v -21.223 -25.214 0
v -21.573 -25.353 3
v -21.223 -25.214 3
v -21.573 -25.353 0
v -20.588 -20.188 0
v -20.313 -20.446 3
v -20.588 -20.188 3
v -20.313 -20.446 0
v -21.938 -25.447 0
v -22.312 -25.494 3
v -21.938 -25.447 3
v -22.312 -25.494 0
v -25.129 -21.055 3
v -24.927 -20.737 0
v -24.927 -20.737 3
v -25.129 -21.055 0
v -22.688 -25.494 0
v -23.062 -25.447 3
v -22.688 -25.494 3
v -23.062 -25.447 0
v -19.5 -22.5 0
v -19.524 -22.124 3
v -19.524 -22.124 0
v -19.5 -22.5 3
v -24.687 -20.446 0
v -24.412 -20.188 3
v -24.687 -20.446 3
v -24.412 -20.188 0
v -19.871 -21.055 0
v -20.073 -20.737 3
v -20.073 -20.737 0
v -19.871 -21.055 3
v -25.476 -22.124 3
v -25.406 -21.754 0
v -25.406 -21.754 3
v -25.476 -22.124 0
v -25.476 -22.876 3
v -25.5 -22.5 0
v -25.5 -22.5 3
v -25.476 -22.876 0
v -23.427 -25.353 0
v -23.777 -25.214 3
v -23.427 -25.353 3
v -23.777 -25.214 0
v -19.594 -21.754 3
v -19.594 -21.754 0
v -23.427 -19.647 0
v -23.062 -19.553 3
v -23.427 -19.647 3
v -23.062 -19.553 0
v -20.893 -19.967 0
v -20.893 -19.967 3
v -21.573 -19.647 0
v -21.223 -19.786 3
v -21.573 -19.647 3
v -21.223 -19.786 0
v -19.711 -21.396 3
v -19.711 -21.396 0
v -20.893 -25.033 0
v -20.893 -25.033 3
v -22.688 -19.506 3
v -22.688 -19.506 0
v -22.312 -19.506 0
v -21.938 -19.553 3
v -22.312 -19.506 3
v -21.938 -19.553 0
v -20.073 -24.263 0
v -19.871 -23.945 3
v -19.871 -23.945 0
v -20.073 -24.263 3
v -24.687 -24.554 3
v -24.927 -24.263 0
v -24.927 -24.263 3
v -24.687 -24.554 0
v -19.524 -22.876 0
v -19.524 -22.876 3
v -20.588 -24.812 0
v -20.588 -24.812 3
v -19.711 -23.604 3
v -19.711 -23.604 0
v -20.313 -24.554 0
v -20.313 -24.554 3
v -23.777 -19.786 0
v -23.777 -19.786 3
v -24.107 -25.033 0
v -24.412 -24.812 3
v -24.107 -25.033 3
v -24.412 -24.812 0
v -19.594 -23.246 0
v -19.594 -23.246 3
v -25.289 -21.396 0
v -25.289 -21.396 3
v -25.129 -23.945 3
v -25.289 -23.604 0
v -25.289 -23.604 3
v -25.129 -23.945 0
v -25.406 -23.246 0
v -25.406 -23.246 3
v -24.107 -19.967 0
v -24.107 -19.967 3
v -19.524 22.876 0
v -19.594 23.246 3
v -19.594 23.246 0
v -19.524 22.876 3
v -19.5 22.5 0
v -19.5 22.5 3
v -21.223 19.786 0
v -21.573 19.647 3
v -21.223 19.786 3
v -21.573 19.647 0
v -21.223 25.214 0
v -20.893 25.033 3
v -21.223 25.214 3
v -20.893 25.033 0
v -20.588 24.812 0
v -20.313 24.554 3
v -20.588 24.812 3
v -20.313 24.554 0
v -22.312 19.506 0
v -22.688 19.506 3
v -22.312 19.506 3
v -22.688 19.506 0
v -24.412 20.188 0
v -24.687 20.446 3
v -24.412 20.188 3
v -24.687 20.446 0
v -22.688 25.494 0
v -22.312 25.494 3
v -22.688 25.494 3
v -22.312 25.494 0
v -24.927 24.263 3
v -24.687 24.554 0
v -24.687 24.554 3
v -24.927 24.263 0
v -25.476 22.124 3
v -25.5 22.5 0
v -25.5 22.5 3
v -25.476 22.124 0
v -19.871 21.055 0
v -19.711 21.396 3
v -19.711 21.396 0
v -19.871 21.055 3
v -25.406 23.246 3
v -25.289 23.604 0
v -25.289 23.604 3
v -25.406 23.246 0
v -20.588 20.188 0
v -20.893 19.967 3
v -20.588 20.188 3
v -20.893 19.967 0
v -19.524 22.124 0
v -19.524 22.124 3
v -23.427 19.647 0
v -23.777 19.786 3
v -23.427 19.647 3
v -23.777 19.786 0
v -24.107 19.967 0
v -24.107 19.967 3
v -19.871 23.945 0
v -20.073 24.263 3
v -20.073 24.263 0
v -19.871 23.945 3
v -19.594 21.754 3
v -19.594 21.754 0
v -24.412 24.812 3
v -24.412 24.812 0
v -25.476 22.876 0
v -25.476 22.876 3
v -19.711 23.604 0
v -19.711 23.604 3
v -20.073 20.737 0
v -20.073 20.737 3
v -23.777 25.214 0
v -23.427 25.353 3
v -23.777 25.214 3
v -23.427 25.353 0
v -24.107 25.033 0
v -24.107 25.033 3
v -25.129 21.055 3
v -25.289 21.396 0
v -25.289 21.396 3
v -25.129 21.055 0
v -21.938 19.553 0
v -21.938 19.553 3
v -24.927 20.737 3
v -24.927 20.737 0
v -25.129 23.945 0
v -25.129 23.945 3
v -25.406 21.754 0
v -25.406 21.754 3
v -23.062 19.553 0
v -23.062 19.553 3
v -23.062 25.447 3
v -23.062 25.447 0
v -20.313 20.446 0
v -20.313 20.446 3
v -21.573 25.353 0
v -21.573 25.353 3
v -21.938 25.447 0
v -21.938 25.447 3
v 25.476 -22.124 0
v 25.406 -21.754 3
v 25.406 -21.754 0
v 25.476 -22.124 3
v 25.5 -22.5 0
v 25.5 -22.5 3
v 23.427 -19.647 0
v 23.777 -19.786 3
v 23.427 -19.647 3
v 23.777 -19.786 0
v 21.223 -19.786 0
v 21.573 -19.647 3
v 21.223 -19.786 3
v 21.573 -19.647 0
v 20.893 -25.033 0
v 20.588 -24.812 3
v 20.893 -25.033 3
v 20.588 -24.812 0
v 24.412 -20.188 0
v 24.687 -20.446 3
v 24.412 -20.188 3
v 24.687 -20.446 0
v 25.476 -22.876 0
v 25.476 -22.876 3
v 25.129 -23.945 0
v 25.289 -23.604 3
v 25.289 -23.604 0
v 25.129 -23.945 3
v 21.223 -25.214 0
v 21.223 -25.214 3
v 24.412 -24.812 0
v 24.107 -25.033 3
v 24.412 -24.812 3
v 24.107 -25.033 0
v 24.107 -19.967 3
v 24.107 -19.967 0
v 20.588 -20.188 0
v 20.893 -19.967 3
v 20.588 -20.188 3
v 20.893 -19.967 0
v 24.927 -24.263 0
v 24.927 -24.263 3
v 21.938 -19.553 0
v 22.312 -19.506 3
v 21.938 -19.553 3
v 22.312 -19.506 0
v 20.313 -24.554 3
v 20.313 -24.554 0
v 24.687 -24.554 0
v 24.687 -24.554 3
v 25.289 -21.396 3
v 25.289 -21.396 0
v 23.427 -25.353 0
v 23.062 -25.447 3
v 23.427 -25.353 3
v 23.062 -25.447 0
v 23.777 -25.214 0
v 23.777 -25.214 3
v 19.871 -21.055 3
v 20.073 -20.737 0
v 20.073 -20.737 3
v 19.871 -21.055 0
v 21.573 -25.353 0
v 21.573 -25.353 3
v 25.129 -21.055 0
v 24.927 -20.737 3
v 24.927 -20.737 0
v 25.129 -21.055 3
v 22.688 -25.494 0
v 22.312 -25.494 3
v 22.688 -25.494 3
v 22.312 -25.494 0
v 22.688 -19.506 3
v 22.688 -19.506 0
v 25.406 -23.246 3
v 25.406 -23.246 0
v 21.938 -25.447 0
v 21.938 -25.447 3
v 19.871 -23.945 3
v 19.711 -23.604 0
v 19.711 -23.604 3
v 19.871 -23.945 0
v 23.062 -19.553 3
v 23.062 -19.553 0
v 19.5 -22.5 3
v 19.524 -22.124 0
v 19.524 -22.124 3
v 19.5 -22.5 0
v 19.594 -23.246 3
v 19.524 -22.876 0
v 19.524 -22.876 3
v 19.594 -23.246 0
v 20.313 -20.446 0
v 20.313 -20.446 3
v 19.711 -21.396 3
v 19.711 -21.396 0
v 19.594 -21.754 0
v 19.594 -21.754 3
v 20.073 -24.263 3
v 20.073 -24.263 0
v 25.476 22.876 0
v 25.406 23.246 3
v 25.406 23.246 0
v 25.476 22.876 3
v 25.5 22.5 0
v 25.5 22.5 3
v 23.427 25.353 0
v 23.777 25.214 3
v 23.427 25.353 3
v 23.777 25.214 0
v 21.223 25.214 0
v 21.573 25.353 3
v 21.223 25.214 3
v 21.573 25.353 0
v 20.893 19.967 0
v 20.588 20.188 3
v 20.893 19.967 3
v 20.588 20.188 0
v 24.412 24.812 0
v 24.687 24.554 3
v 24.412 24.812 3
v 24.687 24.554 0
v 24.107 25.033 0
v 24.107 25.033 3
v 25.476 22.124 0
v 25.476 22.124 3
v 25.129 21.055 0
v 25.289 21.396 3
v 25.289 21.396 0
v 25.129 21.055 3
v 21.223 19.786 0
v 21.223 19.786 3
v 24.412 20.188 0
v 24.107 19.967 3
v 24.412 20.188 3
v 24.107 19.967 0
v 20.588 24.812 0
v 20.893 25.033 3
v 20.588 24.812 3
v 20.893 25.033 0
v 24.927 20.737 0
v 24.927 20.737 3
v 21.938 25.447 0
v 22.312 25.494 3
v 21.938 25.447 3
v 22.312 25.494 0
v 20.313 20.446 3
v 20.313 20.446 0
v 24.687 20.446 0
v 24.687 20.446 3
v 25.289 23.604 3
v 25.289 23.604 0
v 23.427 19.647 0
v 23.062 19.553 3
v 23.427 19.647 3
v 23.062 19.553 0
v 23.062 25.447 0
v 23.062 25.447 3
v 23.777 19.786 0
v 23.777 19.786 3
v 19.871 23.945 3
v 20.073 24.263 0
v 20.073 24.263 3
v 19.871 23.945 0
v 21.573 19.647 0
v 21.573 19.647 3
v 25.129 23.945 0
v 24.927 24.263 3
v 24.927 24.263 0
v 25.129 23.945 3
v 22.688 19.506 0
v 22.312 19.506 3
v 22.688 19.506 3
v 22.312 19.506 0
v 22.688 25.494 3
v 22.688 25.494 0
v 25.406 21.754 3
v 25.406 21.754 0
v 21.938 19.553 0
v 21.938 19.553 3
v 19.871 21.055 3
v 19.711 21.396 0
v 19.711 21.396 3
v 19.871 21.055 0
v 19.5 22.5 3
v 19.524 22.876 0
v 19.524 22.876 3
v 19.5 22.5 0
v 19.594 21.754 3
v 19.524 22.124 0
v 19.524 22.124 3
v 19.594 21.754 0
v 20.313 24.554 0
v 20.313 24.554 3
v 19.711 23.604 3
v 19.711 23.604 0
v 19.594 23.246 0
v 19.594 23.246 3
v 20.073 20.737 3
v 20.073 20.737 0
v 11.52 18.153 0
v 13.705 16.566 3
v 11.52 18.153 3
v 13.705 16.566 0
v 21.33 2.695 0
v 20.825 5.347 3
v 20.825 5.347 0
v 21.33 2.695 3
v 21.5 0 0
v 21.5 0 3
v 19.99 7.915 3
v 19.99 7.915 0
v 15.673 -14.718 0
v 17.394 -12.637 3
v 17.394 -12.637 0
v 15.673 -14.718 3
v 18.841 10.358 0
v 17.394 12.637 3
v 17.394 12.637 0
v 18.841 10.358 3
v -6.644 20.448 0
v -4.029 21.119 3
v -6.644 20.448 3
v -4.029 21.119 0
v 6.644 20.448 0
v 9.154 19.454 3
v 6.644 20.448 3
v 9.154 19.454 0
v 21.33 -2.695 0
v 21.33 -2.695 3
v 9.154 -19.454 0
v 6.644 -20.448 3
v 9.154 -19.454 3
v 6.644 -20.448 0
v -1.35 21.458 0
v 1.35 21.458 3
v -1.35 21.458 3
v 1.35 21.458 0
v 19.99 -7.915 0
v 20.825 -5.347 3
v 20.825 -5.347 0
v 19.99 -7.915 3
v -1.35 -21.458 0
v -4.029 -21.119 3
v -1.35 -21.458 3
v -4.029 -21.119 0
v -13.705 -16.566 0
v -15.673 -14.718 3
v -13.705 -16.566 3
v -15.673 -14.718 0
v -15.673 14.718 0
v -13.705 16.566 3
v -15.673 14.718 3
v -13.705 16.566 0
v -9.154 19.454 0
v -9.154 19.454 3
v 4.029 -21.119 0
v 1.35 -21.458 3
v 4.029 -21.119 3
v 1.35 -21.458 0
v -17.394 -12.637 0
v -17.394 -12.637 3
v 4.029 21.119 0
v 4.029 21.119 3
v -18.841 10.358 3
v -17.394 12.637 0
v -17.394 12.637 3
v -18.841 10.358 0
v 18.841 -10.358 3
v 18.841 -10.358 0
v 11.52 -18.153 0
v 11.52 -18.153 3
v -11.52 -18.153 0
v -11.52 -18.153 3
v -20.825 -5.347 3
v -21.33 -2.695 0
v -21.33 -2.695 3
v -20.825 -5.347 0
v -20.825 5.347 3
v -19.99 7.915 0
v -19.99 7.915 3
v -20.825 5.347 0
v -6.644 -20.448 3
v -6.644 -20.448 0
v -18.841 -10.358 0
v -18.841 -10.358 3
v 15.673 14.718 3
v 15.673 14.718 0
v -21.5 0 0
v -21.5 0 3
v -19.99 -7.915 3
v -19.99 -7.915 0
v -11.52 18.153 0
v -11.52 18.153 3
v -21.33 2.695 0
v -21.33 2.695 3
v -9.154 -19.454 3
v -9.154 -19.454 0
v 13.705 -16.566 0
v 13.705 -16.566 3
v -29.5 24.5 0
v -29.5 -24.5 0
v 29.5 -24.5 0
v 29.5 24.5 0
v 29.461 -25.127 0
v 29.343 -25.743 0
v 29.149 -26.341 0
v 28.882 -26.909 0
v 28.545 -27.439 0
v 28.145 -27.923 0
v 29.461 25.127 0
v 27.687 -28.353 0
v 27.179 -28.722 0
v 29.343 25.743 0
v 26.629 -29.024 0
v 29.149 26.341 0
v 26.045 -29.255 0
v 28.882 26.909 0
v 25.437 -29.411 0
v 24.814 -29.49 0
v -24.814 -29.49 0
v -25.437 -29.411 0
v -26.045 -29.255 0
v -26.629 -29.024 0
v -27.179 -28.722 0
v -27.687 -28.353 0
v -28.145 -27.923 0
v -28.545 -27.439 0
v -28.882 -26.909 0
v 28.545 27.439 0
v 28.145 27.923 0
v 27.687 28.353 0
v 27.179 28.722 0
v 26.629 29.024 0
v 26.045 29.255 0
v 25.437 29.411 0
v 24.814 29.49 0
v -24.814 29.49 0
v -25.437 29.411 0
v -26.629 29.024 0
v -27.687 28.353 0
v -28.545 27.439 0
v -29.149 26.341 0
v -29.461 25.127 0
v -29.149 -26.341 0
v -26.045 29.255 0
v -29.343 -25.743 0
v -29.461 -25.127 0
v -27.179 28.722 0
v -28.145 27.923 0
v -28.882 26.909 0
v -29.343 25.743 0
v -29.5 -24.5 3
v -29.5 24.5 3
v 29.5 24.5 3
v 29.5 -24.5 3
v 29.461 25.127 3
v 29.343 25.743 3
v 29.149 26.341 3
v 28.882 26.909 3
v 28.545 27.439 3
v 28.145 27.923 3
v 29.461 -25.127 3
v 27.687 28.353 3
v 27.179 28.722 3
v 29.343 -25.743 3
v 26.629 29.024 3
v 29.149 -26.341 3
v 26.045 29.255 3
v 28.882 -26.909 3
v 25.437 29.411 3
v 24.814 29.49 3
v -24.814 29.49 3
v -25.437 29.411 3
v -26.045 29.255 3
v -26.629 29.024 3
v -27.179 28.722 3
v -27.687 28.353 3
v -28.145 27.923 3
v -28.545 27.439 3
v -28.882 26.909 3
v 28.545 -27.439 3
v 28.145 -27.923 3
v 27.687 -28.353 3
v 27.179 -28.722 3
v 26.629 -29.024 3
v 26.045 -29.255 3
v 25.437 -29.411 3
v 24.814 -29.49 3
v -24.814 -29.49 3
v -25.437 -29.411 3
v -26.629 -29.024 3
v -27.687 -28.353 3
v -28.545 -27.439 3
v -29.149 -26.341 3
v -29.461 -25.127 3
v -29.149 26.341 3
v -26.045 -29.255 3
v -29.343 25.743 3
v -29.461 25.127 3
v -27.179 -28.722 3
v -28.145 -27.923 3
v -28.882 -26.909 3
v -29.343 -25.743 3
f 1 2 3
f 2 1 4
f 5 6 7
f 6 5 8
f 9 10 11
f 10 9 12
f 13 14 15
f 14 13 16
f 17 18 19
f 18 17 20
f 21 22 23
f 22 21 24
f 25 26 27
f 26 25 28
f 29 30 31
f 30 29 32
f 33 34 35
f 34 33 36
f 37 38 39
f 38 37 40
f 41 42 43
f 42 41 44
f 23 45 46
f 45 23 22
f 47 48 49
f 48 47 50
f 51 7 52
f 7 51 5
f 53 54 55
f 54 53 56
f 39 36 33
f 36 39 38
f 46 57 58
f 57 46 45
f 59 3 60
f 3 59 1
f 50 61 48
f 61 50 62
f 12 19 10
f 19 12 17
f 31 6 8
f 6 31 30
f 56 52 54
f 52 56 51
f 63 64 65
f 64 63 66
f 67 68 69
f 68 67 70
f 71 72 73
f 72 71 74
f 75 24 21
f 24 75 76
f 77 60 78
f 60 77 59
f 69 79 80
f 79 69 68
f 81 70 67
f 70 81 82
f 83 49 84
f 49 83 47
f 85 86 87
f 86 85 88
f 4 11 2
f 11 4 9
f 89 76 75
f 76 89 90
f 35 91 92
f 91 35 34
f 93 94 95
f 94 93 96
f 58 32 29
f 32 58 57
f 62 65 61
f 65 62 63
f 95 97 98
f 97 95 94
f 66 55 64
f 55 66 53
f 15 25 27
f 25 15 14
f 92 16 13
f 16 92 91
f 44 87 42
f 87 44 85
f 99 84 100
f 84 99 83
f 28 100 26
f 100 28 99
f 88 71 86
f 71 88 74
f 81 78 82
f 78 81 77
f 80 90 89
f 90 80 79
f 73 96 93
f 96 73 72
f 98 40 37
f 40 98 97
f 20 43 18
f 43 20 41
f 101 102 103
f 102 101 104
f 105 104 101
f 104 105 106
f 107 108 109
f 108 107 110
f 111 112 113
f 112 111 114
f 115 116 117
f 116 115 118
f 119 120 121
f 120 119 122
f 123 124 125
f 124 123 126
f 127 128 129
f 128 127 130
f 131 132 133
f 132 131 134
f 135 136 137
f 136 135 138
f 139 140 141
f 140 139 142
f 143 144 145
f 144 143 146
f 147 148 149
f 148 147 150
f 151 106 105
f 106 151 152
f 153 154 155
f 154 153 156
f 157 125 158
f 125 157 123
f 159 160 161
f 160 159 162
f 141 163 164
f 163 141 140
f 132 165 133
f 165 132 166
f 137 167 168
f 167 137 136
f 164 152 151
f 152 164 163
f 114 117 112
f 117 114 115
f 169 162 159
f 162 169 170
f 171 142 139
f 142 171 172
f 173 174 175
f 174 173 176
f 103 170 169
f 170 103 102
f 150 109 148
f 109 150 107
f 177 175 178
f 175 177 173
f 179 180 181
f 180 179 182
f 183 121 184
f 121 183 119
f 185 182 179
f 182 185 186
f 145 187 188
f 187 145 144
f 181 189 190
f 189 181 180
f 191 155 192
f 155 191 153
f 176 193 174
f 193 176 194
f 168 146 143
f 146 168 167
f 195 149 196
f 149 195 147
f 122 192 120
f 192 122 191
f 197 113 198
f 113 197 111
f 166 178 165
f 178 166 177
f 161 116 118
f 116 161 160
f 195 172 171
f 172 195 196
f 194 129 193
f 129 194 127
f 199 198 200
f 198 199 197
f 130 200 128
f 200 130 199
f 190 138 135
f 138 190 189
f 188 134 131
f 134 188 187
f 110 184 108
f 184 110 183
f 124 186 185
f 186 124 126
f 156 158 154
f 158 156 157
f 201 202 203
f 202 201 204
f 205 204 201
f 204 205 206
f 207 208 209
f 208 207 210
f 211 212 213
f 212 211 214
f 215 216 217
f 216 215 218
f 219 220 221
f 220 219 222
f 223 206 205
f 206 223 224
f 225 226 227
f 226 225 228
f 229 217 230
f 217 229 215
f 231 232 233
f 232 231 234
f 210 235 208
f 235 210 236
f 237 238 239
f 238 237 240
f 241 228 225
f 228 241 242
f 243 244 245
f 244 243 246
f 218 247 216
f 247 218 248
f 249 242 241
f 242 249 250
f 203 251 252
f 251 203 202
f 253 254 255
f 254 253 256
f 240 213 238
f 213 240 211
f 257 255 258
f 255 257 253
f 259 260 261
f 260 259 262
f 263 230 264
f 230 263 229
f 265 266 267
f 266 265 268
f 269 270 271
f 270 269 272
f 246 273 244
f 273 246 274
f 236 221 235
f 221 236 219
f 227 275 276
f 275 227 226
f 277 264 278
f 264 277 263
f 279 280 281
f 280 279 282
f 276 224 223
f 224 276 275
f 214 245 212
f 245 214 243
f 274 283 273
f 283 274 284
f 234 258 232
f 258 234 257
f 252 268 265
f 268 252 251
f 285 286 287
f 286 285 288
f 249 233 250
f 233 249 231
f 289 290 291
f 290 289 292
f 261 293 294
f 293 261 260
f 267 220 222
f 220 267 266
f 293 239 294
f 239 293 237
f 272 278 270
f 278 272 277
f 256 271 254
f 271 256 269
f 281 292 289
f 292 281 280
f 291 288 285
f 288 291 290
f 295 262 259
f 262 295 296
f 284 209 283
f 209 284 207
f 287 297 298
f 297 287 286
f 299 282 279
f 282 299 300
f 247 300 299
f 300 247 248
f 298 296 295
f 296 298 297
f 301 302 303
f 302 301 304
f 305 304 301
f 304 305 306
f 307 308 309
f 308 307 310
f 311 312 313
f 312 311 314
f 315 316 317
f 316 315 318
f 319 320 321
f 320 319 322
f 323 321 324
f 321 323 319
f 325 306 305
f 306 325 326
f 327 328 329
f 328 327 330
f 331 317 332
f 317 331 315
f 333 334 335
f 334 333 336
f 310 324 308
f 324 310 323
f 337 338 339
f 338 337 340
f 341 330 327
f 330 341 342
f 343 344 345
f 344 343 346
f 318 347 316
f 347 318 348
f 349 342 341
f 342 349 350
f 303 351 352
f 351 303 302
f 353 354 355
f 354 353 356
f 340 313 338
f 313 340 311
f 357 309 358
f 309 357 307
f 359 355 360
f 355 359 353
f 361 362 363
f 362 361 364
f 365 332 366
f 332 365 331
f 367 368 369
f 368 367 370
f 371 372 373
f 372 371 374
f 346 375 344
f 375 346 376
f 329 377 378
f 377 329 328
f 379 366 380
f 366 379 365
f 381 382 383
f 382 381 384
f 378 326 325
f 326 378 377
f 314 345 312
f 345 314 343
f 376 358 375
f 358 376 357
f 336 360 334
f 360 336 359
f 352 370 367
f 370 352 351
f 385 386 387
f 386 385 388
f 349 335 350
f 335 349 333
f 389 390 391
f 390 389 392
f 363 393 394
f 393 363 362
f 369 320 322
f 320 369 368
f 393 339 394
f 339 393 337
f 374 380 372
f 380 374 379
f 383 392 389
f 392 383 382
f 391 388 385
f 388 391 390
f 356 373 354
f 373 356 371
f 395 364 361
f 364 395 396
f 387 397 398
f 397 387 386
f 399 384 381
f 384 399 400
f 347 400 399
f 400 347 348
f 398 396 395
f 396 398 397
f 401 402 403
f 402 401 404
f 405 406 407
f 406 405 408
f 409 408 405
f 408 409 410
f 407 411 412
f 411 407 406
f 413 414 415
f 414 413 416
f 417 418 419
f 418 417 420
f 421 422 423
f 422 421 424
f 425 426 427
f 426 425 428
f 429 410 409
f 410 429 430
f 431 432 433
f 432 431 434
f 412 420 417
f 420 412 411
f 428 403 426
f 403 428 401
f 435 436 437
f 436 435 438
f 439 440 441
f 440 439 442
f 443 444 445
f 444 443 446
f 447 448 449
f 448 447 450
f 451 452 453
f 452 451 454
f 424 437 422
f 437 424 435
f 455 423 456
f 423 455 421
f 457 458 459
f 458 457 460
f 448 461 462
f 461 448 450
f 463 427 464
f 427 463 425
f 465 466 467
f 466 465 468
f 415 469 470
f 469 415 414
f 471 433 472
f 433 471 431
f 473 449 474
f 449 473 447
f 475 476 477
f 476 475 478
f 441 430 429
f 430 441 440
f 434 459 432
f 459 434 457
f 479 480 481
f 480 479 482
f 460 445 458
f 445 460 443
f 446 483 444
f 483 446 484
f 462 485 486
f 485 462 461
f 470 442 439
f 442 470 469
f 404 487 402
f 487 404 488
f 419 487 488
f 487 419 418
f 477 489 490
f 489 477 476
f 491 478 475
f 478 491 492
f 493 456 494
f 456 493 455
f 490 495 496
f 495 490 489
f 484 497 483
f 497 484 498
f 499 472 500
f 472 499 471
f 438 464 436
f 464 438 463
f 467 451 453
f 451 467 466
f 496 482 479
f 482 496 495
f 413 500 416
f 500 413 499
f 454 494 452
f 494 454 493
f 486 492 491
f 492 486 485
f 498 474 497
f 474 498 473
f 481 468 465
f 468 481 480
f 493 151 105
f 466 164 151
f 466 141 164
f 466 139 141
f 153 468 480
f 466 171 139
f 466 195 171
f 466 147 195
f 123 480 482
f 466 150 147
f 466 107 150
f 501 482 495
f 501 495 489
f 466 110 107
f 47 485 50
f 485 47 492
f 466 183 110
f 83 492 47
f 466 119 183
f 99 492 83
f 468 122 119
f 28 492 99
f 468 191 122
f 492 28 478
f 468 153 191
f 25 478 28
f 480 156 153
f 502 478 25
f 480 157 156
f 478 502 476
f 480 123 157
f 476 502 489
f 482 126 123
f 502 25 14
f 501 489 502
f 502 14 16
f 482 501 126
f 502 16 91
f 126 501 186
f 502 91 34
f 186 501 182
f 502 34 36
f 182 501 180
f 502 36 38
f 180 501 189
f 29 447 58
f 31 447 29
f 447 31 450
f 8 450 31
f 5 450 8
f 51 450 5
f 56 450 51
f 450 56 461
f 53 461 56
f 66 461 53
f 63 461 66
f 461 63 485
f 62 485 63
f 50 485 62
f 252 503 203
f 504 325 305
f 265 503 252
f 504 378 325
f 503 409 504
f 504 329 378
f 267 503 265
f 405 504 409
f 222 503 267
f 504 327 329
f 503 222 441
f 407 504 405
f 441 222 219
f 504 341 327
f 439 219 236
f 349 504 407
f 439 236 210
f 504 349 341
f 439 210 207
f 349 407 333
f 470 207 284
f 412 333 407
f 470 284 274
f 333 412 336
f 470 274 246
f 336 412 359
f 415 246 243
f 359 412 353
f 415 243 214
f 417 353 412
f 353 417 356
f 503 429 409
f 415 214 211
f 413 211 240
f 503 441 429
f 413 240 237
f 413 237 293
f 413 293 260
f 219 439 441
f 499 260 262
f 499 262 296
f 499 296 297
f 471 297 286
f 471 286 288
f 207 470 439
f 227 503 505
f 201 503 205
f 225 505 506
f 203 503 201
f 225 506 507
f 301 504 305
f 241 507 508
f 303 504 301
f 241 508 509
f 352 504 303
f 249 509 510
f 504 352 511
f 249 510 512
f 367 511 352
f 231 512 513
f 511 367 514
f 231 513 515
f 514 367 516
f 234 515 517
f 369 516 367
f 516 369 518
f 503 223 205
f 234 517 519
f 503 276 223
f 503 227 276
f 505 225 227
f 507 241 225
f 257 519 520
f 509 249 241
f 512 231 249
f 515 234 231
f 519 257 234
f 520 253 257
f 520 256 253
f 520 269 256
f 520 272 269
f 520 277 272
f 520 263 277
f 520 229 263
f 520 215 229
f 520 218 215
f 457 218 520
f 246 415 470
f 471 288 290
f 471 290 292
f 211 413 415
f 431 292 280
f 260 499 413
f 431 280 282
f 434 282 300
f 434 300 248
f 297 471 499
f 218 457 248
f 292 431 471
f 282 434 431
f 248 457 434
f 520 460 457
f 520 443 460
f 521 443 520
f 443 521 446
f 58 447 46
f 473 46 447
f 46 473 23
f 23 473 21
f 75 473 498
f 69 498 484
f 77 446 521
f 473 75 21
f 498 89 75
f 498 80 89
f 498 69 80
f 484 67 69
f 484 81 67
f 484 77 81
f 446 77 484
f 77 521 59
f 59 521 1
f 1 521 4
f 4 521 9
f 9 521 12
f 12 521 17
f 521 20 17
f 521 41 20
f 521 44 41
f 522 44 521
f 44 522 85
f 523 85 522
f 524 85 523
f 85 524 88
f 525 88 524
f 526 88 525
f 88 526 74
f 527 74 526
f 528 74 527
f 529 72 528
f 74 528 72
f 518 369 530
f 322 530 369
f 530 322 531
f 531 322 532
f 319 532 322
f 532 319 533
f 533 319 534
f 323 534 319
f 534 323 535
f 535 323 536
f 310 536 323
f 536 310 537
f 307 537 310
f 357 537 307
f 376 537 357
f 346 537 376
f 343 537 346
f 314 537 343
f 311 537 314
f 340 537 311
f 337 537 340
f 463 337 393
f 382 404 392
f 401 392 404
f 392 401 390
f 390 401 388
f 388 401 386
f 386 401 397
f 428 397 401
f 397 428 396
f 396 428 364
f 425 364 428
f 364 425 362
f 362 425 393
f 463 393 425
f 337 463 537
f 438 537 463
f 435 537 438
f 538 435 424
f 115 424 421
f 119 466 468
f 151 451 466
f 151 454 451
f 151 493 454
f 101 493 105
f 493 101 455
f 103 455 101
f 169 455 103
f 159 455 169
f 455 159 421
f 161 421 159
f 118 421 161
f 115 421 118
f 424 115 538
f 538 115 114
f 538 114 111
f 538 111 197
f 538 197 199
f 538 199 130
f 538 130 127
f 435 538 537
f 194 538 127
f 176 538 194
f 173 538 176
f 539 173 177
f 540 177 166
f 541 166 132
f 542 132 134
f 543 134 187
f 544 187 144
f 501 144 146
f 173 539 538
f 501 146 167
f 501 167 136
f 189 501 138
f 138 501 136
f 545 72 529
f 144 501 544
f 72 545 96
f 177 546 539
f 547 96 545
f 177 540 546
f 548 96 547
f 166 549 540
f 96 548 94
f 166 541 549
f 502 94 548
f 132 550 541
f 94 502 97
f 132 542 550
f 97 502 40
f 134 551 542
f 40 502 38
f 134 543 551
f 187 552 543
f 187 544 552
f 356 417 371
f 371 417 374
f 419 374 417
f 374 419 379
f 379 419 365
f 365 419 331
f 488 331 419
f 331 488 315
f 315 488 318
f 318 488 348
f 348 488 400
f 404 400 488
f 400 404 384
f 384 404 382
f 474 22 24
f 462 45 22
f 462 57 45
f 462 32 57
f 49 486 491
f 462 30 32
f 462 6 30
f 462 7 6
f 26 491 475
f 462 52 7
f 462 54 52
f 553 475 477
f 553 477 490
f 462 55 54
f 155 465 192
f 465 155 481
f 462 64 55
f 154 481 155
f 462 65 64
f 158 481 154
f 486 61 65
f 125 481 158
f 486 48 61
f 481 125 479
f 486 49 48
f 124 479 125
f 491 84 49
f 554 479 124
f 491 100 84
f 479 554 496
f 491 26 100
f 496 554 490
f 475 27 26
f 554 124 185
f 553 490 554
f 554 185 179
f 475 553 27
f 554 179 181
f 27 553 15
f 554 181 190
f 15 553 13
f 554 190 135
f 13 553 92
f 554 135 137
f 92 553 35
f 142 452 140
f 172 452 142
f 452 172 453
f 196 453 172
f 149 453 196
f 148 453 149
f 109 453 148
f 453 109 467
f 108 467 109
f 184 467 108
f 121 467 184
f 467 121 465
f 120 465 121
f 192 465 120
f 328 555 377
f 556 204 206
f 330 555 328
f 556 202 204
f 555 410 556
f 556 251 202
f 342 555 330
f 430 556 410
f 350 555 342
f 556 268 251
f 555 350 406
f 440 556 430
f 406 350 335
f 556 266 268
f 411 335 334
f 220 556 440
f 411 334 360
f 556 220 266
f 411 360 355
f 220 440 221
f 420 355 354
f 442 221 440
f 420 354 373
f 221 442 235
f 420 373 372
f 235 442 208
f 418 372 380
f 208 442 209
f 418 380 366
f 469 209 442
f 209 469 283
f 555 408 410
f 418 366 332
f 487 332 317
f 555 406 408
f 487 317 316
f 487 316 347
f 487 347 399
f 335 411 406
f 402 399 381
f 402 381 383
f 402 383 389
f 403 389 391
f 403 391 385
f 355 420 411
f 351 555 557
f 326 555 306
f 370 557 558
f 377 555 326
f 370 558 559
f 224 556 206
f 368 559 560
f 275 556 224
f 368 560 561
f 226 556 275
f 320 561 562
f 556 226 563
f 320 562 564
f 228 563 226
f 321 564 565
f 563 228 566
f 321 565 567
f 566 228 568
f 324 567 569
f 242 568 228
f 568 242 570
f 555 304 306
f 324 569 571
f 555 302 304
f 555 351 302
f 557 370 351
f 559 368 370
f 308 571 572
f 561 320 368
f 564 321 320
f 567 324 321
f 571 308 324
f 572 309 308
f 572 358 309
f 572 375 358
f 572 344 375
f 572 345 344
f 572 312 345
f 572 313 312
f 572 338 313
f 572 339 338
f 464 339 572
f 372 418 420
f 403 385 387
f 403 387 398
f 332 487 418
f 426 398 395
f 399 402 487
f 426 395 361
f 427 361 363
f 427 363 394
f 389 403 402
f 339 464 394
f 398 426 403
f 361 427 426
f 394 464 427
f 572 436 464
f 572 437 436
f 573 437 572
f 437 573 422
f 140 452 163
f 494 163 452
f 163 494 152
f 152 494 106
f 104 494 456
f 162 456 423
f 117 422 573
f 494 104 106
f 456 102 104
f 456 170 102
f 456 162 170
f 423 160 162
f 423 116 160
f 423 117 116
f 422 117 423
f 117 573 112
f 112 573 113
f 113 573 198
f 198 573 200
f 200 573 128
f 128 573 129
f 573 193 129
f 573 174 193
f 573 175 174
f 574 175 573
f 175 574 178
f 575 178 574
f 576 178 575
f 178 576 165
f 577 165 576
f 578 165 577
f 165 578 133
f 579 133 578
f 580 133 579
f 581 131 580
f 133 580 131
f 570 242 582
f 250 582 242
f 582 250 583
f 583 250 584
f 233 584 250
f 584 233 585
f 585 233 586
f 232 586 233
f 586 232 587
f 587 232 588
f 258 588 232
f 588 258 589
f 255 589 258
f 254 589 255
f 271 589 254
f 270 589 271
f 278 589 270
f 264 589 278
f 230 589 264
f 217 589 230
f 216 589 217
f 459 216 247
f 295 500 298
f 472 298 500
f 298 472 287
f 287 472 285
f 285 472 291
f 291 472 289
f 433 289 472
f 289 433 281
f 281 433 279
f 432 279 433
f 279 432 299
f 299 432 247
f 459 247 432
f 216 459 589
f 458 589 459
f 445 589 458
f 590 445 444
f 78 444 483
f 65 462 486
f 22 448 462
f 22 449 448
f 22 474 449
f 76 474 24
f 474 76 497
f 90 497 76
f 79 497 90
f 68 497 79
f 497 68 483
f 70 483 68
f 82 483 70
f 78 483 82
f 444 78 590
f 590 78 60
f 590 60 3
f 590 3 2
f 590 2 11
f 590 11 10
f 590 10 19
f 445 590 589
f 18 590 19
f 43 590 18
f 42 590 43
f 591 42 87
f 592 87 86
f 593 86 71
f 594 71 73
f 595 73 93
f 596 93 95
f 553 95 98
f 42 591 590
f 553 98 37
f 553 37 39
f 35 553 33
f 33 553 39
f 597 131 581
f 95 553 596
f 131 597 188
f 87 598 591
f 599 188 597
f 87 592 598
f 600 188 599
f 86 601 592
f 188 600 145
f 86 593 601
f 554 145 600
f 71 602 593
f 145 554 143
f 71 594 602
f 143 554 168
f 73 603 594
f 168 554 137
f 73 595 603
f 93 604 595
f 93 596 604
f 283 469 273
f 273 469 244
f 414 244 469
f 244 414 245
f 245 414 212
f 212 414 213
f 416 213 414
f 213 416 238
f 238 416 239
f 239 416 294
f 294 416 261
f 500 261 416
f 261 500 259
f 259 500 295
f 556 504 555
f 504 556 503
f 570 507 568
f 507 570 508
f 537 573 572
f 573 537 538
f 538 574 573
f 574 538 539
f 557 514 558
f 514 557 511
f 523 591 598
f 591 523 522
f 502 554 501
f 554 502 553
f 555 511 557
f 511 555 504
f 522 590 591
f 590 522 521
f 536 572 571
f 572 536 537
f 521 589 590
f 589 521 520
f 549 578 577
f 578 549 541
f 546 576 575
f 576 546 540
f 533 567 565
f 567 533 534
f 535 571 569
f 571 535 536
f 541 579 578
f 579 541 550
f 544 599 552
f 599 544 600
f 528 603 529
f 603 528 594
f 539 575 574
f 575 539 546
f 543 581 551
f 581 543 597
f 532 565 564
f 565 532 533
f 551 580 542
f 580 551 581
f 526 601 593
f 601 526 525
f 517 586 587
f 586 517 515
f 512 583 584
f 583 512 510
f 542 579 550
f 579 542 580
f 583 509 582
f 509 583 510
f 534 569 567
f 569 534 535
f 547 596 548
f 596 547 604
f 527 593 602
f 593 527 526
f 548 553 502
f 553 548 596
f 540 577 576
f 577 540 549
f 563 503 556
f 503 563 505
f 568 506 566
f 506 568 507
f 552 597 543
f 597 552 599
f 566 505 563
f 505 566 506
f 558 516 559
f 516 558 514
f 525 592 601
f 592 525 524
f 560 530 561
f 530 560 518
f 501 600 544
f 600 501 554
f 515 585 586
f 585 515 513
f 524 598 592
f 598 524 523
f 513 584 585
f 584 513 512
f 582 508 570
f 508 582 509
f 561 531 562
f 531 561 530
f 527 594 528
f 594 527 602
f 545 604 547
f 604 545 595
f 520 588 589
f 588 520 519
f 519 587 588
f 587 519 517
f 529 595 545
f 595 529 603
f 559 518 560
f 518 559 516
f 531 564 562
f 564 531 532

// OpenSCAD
$fn = 50;


difference() {
	union() {
		hull() {
			translate(v = [-24.5000000000, 24.5000000000, 0]) {
				cylinder(h = 3, r = 5);
			}
			translate(v = [24.5000000000, 24.5000000000, 0]) {
				cylinder(h = 3, r = 5);
			}
			translate(v = [-24.5000000000, -24.5000000000, 0]) {
				cylinder(h = 3, r = 5);
			}
			translate(v = [24.5000000000, -24.5000000000, 0]) {
				cylinder(h = 3, r = 5);
			}
		}
	}
	union() {
		#translate(v = [-22.5000000000, -22.5000000000, -100.0000000000]) {
			cylinder(h = 200, r = 3.0000000000);
		}
		#translate(v = [-22.5000000000, 22.5000000000, -100.0000000000]) {
			cylinder(h = 200, r = 3.0000000000);
		}
		#translate(v = [22.5000000000, -22.5000000000, -100.0000000000]) {
			cylinder(h = 200, r = 3.0000000000);
		}
		#translate(v = [22.5000000000, 22.5000000000, -100.0000000000]) {
			cylinder(h = 200, r = 3.0000000000);
		}
		#cylinder(h = 3, r = 21.5000000000);
	}
}
